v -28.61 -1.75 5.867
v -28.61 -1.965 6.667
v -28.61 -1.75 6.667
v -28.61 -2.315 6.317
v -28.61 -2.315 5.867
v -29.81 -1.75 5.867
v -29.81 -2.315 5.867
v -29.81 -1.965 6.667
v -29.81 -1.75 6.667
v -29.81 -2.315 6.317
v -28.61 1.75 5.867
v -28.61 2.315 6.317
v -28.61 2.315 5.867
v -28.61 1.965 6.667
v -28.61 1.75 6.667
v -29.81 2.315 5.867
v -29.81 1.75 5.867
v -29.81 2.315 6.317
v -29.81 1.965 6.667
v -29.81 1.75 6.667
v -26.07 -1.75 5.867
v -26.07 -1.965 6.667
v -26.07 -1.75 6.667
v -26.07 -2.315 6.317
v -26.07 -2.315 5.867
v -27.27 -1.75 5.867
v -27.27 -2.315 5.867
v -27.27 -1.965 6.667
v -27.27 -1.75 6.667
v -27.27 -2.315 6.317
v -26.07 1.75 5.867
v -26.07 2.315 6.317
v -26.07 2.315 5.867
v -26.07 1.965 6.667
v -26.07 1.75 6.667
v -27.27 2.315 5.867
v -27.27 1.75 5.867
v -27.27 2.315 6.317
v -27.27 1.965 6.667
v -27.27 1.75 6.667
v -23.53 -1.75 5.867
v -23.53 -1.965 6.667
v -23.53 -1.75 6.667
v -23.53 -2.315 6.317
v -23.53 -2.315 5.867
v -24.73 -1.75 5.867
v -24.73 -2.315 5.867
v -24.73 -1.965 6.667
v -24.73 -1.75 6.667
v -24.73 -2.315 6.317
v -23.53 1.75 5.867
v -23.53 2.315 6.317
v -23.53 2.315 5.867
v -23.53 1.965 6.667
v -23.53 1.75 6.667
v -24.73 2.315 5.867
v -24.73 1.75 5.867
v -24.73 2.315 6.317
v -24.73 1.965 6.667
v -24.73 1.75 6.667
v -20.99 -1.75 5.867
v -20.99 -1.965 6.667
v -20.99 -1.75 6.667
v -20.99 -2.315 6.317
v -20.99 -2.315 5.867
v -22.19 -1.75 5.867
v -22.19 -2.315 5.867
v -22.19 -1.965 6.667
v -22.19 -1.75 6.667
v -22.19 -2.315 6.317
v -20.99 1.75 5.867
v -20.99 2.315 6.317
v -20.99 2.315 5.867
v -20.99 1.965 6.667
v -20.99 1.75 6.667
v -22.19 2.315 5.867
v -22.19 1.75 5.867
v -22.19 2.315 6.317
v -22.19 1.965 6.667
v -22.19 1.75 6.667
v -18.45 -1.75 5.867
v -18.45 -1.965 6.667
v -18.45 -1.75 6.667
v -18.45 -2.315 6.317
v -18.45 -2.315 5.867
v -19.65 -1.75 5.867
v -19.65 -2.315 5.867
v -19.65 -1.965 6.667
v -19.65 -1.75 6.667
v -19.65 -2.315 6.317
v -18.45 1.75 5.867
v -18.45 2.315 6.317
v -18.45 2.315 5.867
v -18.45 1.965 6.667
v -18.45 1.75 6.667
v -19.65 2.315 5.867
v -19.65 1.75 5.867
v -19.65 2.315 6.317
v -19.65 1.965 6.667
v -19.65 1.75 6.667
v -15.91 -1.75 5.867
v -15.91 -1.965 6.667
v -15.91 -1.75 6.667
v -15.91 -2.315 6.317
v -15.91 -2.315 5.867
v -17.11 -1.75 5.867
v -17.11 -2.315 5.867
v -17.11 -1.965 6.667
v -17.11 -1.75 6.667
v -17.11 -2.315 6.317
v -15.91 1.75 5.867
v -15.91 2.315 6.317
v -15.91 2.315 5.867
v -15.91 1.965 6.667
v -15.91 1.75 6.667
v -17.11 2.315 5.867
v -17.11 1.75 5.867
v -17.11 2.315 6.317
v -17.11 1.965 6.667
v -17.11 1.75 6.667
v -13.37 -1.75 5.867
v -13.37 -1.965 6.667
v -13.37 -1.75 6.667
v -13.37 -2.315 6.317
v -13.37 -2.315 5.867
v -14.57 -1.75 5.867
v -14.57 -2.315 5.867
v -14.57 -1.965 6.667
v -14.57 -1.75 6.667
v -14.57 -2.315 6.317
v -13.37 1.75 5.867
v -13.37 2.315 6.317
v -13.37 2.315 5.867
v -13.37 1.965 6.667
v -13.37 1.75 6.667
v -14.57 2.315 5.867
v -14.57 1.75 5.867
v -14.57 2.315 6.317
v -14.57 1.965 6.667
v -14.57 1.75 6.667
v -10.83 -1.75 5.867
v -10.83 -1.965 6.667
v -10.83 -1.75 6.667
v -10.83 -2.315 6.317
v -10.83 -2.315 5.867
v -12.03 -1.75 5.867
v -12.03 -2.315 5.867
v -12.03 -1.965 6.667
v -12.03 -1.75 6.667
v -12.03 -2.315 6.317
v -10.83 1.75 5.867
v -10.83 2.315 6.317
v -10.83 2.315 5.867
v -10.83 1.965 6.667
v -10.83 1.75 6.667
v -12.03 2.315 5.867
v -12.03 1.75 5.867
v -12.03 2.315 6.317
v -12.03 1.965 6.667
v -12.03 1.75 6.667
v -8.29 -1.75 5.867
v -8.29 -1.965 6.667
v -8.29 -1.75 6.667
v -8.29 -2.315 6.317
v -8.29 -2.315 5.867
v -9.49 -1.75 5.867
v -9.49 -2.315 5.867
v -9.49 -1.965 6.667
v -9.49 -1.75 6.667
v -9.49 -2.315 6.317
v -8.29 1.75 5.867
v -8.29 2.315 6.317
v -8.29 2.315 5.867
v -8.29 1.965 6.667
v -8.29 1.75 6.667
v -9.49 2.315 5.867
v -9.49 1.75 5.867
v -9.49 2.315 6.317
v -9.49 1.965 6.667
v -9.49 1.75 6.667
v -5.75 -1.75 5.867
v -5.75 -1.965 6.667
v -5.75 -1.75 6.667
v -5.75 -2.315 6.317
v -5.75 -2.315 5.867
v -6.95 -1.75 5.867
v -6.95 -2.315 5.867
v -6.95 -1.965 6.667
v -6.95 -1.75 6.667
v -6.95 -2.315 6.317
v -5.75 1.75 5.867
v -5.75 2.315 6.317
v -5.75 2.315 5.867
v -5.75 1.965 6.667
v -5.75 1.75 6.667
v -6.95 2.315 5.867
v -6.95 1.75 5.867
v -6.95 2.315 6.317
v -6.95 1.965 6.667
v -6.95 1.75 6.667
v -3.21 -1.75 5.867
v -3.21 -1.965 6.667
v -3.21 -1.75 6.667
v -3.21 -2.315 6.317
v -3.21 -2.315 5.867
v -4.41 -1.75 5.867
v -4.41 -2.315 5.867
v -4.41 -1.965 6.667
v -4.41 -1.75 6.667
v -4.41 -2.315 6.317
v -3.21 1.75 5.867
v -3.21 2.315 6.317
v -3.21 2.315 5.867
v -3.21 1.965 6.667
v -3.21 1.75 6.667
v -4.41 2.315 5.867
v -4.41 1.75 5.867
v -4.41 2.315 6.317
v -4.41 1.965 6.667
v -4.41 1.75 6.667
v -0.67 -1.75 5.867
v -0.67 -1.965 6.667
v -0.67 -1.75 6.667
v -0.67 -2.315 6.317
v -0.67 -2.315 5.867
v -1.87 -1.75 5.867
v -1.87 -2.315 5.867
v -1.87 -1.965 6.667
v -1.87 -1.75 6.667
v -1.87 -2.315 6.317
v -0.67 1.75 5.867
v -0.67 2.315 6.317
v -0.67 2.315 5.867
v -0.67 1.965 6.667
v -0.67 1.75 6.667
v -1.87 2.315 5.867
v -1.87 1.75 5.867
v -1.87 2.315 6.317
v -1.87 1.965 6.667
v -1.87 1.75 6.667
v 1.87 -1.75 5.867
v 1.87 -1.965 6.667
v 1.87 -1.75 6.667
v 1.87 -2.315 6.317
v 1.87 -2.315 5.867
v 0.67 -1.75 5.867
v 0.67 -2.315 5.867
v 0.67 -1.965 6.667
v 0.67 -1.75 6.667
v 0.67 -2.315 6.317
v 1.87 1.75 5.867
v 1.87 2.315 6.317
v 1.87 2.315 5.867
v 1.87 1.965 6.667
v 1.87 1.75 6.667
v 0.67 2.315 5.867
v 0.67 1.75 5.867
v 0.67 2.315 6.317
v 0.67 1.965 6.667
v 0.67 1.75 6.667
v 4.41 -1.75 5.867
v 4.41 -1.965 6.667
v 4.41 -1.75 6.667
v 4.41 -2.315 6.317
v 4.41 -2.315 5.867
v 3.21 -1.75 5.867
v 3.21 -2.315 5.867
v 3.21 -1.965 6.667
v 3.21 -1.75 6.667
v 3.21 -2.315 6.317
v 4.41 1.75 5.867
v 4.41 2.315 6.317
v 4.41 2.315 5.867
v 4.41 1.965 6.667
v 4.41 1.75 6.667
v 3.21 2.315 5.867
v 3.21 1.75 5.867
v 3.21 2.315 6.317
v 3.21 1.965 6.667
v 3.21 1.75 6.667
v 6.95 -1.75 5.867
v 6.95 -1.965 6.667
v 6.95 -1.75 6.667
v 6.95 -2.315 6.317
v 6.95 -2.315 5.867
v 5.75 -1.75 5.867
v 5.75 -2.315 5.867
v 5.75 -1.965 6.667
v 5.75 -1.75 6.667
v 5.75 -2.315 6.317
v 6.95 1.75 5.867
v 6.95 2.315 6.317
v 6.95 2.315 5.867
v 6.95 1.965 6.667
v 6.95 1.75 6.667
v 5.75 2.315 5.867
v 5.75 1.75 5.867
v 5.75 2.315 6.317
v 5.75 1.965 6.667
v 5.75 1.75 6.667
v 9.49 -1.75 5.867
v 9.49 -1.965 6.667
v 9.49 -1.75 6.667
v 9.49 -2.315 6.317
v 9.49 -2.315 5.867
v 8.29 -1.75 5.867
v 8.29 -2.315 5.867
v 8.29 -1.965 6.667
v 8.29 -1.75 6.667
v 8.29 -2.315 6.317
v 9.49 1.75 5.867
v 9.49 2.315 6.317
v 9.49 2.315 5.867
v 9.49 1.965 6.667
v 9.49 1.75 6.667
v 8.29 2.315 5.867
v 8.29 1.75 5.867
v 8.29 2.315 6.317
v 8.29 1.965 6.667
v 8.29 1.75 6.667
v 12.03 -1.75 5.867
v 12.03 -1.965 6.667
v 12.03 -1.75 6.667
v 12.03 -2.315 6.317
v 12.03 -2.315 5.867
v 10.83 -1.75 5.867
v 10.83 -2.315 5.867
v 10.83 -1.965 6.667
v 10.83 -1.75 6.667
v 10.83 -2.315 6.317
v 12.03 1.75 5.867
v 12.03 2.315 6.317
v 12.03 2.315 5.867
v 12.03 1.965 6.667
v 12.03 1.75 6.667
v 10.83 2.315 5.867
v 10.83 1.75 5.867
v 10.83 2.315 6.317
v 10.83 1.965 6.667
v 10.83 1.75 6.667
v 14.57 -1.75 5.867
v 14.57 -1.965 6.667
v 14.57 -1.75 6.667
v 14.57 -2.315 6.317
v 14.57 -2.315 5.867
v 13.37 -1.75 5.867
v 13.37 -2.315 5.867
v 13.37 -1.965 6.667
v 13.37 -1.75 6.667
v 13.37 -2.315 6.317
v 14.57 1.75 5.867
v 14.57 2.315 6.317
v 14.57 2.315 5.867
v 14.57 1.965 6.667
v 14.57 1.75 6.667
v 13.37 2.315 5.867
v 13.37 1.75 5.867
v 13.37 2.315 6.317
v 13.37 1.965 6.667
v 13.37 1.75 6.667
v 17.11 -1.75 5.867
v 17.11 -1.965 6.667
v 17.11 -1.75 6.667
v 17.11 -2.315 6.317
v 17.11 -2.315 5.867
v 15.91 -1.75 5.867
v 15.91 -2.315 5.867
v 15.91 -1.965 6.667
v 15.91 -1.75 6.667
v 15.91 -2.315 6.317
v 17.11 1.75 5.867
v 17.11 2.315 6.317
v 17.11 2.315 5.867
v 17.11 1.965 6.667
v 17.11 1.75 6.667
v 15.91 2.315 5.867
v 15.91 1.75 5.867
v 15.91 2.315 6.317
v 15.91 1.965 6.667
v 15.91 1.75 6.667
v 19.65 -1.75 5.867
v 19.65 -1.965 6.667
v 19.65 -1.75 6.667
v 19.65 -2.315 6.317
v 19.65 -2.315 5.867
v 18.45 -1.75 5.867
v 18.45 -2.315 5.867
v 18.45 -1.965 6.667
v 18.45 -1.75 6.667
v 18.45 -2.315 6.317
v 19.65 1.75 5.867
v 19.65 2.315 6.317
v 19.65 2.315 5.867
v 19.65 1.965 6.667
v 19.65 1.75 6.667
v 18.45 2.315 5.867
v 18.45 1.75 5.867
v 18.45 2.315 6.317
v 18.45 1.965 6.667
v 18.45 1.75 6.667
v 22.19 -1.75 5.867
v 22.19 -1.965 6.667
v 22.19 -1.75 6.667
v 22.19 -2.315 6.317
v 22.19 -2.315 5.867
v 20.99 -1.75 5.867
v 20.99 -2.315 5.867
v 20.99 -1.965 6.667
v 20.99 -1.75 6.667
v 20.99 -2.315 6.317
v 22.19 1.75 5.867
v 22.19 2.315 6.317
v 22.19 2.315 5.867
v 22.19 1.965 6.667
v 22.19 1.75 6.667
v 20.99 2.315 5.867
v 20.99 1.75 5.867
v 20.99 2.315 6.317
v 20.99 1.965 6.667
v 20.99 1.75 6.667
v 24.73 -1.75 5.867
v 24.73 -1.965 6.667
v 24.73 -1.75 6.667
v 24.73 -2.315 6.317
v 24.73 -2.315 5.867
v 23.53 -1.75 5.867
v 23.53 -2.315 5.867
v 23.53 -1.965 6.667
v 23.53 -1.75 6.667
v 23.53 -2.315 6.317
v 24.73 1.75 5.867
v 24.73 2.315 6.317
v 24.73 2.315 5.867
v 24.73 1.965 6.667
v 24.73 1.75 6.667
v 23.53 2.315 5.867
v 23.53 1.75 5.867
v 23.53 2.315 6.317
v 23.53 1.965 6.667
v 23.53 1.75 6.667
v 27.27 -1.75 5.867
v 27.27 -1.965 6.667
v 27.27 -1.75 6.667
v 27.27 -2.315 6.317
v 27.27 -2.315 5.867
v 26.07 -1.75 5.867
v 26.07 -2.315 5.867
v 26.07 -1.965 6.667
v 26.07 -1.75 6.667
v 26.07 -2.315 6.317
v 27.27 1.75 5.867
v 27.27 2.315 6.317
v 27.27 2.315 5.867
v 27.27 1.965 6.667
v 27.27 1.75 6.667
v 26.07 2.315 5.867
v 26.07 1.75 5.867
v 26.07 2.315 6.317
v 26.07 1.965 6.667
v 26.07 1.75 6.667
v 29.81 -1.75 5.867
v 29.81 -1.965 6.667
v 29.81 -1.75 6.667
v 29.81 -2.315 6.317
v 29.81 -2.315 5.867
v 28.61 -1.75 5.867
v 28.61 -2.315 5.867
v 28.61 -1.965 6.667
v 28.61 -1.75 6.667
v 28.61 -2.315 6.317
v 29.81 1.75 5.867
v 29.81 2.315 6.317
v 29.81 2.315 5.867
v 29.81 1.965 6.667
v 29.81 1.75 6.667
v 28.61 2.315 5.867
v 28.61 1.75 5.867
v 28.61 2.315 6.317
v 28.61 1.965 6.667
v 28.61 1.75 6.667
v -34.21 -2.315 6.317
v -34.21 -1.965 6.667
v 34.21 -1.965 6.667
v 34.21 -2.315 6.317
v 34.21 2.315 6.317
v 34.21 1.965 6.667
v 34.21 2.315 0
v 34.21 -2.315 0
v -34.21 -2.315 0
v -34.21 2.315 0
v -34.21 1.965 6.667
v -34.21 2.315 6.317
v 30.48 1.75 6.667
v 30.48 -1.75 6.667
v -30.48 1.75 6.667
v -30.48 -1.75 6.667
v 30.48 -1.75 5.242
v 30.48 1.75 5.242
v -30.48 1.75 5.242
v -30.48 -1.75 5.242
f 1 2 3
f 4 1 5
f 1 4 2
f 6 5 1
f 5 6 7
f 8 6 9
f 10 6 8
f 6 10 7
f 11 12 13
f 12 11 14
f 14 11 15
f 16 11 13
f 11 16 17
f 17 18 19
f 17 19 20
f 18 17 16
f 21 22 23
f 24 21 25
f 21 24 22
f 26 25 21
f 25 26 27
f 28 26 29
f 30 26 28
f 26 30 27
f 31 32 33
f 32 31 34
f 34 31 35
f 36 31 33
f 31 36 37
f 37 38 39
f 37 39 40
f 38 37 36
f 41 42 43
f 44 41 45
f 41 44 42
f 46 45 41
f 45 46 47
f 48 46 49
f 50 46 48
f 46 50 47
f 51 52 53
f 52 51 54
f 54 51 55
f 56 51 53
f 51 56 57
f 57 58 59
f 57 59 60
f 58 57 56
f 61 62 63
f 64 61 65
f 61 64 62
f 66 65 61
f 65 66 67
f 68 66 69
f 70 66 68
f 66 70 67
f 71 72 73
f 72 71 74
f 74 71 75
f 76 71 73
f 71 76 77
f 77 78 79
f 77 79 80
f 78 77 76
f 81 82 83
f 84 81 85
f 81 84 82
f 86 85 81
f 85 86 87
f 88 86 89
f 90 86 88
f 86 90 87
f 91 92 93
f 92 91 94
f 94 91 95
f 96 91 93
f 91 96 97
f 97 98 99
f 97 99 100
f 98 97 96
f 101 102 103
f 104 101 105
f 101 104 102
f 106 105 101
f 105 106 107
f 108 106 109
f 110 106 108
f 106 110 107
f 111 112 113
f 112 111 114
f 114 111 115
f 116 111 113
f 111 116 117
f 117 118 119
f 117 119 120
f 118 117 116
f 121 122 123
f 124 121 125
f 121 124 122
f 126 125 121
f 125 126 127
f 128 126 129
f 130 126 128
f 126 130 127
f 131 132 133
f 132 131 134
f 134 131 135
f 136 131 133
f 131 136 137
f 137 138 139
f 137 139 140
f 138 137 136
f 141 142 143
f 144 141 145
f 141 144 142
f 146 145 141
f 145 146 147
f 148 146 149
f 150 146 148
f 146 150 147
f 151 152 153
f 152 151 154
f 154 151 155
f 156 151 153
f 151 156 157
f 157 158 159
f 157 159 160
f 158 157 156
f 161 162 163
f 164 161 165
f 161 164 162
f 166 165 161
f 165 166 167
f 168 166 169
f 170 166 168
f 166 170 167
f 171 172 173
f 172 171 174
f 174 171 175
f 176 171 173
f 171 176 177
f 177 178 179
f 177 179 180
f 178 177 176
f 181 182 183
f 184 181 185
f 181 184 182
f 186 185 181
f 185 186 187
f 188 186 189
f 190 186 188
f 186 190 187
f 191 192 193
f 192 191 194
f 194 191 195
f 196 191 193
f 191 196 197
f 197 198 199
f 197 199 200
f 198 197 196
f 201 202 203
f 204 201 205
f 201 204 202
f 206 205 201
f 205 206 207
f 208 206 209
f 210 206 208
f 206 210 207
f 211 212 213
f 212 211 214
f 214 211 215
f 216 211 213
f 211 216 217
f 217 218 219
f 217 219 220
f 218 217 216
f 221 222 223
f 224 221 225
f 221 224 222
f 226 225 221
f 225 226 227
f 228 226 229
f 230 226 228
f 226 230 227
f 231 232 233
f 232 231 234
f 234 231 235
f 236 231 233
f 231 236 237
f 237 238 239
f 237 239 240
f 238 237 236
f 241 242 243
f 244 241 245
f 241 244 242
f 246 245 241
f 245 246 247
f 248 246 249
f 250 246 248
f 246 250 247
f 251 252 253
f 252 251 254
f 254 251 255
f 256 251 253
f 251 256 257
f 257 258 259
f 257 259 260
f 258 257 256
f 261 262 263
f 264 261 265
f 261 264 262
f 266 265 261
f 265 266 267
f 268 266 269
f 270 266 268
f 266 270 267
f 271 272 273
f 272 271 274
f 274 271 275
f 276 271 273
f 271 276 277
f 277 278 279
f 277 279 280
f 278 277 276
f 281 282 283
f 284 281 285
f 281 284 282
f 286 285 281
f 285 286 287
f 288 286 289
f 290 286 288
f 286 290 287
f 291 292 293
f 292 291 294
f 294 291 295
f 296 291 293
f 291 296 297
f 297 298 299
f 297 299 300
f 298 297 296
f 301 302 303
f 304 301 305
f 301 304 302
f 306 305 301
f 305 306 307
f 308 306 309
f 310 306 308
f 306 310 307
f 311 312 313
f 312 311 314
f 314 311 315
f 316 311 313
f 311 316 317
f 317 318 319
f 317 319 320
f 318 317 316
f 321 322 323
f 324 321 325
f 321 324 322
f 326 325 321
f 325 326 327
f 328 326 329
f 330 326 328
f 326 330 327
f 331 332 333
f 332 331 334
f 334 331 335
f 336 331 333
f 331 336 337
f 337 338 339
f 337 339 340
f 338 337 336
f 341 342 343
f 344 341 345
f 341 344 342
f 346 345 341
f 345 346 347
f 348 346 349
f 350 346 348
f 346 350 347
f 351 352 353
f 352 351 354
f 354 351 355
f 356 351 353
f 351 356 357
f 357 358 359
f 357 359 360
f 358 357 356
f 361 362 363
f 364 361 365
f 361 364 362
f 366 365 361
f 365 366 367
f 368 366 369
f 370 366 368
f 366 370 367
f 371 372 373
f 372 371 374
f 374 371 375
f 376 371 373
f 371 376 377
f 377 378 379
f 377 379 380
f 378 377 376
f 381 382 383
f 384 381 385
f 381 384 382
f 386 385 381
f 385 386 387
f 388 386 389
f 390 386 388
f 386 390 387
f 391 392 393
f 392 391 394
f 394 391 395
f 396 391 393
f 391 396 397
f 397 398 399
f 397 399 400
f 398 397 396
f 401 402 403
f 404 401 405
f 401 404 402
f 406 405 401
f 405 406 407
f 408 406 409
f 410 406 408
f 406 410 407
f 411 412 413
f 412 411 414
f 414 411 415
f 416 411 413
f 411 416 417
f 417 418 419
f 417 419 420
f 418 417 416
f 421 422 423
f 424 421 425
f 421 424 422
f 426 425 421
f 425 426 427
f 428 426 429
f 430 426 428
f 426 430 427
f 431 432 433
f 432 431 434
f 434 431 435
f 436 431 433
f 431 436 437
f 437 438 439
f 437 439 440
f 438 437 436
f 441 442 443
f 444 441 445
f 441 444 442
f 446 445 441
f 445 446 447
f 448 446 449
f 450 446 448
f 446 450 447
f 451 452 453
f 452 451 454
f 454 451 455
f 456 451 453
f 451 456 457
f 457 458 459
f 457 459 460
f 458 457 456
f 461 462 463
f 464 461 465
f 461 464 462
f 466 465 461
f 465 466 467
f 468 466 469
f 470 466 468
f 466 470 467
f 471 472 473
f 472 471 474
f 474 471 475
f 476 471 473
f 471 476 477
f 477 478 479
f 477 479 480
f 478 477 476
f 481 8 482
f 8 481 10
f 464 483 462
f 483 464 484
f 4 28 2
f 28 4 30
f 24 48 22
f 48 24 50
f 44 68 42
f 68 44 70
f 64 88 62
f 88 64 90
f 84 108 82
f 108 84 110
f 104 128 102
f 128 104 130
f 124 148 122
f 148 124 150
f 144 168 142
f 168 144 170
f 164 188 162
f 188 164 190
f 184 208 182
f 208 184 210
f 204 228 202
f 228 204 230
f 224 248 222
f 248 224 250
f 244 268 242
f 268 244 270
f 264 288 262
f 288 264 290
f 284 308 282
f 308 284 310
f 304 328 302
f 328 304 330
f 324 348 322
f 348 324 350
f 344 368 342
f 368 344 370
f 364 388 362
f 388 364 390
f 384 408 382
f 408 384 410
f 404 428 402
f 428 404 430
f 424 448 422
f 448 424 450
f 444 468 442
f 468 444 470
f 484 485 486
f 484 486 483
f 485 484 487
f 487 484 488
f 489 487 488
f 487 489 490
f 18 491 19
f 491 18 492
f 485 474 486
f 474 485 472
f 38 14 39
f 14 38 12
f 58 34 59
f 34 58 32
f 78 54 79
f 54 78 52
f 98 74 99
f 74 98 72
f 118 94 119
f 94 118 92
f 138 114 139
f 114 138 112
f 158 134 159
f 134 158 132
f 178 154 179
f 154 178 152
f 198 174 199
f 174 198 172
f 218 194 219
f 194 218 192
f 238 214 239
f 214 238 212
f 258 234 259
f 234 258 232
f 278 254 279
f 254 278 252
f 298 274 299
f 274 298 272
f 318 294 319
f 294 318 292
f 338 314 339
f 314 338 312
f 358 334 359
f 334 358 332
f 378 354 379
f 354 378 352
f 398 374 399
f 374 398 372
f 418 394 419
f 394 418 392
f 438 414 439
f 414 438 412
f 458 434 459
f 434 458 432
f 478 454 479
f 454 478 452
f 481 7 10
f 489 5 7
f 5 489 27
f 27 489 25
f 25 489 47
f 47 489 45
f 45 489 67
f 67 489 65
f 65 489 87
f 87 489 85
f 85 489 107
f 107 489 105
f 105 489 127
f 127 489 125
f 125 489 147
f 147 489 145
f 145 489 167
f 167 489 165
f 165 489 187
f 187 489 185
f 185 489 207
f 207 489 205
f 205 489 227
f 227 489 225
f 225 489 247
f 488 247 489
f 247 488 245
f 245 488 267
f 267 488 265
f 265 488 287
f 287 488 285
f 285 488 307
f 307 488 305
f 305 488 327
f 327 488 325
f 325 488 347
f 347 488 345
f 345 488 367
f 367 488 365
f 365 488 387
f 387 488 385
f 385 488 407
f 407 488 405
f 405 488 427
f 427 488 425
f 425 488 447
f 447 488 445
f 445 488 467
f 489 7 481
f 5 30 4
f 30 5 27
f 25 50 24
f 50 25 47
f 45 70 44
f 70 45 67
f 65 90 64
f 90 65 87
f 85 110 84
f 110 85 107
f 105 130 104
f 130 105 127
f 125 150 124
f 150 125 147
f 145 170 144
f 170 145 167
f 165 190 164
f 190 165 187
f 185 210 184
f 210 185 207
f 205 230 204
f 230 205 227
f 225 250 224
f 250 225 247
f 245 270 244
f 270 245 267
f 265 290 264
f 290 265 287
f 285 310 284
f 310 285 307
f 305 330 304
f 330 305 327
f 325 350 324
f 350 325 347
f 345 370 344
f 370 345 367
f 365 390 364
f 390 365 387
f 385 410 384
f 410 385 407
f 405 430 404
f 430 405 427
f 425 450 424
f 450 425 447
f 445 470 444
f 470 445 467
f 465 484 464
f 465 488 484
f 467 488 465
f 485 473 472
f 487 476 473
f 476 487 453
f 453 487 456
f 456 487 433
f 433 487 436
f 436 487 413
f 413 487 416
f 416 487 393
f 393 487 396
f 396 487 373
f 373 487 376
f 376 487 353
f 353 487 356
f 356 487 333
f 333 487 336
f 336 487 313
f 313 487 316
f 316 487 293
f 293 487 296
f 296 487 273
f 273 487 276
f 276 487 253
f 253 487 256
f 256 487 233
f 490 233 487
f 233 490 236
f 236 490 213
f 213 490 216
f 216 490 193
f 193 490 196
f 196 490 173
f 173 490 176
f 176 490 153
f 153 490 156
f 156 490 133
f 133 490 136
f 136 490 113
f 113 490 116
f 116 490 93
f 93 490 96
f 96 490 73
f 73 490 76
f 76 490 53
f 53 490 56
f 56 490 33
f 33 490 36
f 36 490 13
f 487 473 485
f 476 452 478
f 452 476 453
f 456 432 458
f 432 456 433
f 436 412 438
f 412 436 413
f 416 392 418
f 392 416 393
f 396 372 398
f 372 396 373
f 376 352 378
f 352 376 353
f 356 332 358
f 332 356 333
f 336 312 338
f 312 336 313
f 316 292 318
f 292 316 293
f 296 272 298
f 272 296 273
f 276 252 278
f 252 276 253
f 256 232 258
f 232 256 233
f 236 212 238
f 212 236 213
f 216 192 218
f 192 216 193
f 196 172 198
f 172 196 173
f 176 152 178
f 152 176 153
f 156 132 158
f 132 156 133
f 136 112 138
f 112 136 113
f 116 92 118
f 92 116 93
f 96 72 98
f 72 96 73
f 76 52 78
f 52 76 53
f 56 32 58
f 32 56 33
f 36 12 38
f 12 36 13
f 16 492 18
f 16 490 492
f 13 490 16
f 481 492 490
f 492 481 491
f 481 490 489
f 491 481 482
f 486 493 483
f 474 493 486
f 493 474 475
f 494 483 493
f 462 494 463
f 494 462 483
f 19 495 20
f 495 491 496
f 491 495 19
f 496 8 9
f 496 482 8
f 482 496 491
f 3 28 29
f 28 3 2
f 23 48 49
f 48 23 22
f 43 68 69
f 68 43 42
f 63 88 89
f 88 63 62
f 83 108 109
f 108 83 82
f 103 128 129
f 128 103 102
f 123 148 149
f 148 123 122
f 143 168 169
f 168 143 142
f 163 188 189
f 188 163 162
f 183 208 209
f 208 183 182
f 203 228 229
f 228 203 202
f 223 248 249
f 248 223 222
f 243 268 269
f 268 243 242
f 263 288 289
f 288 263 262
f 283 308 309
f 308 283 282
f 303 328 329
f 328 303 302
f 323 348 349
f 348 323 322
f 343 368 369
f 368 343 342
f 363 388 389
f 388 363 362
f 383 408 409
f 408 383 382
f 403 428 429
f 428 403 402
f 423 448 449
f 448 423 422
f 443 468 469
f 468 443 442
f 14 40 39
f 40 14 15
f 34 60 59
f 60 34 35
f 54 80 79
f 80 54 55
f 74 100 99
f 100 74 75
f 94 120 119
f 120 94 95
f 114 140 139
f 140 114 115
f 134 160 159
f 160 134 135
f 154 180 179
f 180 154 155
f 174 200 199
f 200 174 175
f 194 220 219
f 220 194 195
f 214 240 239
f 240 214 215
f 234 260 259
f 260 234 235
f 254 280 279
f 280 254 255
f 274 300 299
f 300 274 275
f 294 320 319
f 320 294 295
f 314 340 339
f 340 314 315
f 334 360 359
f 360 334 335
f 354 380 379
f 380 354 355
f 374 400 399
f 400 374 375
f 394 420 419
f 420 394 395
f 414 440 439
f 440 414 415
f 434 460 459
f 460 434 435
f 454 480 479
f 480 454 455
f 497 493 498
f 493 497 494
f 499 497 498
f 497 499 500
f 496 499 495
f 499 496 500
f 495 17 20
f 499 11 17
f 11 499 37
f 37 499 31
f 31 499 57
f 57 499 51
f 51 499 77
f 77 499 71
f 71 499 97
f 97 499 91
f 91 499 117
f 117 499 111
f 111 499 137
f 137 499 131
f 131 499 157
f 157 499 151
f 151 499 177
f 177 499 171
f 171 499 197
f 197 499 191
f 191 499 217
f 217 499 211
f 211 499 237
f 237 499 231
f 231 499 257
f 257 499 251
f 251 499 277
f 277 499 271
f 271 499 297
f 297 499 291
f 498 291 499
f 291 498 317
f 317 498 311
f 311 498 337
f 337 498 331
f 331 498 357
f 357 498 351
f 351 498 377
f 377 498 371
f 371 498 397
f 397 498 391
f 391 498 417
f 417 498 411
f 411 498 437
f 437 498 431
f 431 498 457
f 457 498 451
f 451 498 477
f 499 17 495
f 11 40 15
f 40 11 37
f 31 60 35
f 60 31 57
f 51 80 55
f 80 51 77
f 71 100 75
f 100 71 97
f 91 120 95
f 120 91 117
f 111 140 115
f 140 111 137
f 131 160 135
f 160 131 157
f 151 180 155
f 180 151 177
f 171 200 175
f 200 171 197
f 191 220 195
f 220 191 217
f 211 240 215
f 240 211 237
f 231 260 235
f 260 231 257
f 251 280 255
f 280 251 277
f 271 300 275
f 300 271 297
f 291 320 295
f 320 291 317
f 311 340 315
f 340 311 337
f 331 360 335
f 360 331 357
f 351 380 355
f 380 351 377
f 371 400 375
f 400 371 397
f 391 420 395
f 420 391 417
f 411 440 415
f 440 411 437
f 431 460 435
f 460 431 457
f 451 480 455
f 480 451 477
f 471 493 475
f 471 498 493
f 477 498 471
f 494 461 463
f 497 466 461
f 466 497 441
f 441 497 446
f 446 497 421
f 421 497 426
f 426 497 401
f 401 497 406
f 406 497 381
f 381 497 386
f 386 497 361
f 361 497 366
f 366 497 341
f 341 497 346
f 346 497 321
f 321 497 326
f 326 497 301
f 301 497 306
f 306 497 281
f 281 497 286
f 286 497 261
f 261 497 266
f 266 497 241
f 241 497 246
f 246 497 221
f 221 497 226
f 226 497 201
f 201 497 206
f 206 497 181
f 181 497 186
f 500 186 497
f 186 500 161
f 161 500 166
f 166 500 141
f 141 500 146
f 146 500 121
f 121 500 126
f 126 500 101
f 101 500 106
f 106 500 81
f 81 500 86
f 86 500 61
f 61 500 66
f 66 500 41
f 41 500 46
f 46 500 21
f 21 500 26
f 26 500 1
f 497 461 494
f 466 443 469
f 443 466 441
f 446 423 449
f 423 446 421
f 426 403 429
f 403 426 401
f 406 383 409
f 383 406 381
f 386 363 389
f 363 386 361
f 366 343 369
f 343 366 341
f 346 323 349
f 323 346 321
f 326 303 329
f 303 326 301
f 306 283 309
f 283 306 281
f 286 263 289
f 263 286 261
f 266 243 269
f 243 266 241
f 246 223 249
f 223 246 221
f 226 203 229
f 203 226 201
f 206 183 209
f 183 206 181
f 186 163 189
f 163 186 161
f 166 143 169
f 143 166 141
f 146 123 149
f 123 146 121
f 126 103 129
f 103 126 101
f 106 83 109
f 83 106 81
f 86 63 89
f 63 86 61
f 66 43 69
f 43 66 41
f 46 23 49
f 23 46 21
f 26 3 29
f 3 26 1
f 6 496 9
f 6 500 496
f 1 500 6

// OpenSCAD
// Breadboard resistor lead bender inspired by the supplied video screenshots.
// Units: mm. Print the single former upright.

// Small 1/4 W axial resistor and standard breadboard hole spacing.
hole_pitch = 2.54;
hole_count = 2;             // Finished lead pitch: 2 holes = 5.08 mm.
lead_diameter = 0.45;
body_length = 3.2;
body_diameter = 1.7;

resistor_count = 24;
row_pitch = 2.54;
end_margin = 5;
former_height = 20/3;
shoulder_chamfer = 0.35;
body_clearance = 0.3;
// Sized for a 0.4 mm nozzle and 0.2 mm layers: grooves span four layers.
lead_groove_width = 1.2;
lead_groove_depth = 0.8;
body_recess = body_diameter/2 + lead_groove_depth - lead_diameter/2;

target_lead_pitch = hole_count * hole_pitch;
// The vertical leg centerlines lie roughly one lead radius beyond each face.
former_width = target_lead_pitch - lead_diameter;
former_length = (resistor_count - 1) * row_pitch + 2 * end_margin;
body_channel_width = body_length + body_clearance;

assert(hole_count >= 2);
assert(former_width > body_channel_width + 2 * lead_diameter,
       "Lead pitch is too narrow for this resistor body. Increase hole_count.");
assert(row_pitch >= body_diameter,
       "Adjacent resistor bodies would overlap. Increase row_pitch.");
assert(lead_groove_width < row_pitch - 0.8,
       "Leave at least 0.8 mm of material between adjacent grooves.");

module former_blank() {
    // Cross section in the Y/Z plane.  The two small bevels soften the bend.
    rotate([0, 90, 0])
        linear_extrude(height = former_length, center = true)
            polygon([
                [0, -former_width/2],
                [-former_height + shoulder_chamfer, -former_width/2],
                [-former_height, -former_width/2 + shoulder_chamfer],
                [-former_height, former_width/2 - shoulder_chamfer],
                [-former_height + shoulder_chamfer, former_width/2],
                [0, former_width/2]
            ]);
}

module former() {
    difference() {
        former_blank();

        // The bodies sit slightly below the top, bringing their leads close
        // to the lead grooves while leaving the bending shoulders at full height.
        translate([0, 0, former_height - body_recess/2 + 0.01])
            cube([former_length - 2 * end_margin + row_pitch,
                  body_channel_width, body_recess + 0.02], center = true);

        // Open-ended slots at each row position remain visible to a 0.4 mm
        // nozzle. The channel depth keeps the body and lead axes aligned.
        for (i = [0 : resistor_count - 1]) {
            x = (i - (resistor_count - 1)/2) * row_pitch;
            for (side = [-1, 1])
                translate([x,
                           side * (body_channel_width/2 + former_width/2)/2,
                           former_height - lead_groove_depth/2 + 0.01])
                    cube([lead_groove_width,
                          former_width/2 - body_channel_width/2 + 0.04,
                          lead_groove_depth + 0.02], center = true);
        }
    }
}

former();
